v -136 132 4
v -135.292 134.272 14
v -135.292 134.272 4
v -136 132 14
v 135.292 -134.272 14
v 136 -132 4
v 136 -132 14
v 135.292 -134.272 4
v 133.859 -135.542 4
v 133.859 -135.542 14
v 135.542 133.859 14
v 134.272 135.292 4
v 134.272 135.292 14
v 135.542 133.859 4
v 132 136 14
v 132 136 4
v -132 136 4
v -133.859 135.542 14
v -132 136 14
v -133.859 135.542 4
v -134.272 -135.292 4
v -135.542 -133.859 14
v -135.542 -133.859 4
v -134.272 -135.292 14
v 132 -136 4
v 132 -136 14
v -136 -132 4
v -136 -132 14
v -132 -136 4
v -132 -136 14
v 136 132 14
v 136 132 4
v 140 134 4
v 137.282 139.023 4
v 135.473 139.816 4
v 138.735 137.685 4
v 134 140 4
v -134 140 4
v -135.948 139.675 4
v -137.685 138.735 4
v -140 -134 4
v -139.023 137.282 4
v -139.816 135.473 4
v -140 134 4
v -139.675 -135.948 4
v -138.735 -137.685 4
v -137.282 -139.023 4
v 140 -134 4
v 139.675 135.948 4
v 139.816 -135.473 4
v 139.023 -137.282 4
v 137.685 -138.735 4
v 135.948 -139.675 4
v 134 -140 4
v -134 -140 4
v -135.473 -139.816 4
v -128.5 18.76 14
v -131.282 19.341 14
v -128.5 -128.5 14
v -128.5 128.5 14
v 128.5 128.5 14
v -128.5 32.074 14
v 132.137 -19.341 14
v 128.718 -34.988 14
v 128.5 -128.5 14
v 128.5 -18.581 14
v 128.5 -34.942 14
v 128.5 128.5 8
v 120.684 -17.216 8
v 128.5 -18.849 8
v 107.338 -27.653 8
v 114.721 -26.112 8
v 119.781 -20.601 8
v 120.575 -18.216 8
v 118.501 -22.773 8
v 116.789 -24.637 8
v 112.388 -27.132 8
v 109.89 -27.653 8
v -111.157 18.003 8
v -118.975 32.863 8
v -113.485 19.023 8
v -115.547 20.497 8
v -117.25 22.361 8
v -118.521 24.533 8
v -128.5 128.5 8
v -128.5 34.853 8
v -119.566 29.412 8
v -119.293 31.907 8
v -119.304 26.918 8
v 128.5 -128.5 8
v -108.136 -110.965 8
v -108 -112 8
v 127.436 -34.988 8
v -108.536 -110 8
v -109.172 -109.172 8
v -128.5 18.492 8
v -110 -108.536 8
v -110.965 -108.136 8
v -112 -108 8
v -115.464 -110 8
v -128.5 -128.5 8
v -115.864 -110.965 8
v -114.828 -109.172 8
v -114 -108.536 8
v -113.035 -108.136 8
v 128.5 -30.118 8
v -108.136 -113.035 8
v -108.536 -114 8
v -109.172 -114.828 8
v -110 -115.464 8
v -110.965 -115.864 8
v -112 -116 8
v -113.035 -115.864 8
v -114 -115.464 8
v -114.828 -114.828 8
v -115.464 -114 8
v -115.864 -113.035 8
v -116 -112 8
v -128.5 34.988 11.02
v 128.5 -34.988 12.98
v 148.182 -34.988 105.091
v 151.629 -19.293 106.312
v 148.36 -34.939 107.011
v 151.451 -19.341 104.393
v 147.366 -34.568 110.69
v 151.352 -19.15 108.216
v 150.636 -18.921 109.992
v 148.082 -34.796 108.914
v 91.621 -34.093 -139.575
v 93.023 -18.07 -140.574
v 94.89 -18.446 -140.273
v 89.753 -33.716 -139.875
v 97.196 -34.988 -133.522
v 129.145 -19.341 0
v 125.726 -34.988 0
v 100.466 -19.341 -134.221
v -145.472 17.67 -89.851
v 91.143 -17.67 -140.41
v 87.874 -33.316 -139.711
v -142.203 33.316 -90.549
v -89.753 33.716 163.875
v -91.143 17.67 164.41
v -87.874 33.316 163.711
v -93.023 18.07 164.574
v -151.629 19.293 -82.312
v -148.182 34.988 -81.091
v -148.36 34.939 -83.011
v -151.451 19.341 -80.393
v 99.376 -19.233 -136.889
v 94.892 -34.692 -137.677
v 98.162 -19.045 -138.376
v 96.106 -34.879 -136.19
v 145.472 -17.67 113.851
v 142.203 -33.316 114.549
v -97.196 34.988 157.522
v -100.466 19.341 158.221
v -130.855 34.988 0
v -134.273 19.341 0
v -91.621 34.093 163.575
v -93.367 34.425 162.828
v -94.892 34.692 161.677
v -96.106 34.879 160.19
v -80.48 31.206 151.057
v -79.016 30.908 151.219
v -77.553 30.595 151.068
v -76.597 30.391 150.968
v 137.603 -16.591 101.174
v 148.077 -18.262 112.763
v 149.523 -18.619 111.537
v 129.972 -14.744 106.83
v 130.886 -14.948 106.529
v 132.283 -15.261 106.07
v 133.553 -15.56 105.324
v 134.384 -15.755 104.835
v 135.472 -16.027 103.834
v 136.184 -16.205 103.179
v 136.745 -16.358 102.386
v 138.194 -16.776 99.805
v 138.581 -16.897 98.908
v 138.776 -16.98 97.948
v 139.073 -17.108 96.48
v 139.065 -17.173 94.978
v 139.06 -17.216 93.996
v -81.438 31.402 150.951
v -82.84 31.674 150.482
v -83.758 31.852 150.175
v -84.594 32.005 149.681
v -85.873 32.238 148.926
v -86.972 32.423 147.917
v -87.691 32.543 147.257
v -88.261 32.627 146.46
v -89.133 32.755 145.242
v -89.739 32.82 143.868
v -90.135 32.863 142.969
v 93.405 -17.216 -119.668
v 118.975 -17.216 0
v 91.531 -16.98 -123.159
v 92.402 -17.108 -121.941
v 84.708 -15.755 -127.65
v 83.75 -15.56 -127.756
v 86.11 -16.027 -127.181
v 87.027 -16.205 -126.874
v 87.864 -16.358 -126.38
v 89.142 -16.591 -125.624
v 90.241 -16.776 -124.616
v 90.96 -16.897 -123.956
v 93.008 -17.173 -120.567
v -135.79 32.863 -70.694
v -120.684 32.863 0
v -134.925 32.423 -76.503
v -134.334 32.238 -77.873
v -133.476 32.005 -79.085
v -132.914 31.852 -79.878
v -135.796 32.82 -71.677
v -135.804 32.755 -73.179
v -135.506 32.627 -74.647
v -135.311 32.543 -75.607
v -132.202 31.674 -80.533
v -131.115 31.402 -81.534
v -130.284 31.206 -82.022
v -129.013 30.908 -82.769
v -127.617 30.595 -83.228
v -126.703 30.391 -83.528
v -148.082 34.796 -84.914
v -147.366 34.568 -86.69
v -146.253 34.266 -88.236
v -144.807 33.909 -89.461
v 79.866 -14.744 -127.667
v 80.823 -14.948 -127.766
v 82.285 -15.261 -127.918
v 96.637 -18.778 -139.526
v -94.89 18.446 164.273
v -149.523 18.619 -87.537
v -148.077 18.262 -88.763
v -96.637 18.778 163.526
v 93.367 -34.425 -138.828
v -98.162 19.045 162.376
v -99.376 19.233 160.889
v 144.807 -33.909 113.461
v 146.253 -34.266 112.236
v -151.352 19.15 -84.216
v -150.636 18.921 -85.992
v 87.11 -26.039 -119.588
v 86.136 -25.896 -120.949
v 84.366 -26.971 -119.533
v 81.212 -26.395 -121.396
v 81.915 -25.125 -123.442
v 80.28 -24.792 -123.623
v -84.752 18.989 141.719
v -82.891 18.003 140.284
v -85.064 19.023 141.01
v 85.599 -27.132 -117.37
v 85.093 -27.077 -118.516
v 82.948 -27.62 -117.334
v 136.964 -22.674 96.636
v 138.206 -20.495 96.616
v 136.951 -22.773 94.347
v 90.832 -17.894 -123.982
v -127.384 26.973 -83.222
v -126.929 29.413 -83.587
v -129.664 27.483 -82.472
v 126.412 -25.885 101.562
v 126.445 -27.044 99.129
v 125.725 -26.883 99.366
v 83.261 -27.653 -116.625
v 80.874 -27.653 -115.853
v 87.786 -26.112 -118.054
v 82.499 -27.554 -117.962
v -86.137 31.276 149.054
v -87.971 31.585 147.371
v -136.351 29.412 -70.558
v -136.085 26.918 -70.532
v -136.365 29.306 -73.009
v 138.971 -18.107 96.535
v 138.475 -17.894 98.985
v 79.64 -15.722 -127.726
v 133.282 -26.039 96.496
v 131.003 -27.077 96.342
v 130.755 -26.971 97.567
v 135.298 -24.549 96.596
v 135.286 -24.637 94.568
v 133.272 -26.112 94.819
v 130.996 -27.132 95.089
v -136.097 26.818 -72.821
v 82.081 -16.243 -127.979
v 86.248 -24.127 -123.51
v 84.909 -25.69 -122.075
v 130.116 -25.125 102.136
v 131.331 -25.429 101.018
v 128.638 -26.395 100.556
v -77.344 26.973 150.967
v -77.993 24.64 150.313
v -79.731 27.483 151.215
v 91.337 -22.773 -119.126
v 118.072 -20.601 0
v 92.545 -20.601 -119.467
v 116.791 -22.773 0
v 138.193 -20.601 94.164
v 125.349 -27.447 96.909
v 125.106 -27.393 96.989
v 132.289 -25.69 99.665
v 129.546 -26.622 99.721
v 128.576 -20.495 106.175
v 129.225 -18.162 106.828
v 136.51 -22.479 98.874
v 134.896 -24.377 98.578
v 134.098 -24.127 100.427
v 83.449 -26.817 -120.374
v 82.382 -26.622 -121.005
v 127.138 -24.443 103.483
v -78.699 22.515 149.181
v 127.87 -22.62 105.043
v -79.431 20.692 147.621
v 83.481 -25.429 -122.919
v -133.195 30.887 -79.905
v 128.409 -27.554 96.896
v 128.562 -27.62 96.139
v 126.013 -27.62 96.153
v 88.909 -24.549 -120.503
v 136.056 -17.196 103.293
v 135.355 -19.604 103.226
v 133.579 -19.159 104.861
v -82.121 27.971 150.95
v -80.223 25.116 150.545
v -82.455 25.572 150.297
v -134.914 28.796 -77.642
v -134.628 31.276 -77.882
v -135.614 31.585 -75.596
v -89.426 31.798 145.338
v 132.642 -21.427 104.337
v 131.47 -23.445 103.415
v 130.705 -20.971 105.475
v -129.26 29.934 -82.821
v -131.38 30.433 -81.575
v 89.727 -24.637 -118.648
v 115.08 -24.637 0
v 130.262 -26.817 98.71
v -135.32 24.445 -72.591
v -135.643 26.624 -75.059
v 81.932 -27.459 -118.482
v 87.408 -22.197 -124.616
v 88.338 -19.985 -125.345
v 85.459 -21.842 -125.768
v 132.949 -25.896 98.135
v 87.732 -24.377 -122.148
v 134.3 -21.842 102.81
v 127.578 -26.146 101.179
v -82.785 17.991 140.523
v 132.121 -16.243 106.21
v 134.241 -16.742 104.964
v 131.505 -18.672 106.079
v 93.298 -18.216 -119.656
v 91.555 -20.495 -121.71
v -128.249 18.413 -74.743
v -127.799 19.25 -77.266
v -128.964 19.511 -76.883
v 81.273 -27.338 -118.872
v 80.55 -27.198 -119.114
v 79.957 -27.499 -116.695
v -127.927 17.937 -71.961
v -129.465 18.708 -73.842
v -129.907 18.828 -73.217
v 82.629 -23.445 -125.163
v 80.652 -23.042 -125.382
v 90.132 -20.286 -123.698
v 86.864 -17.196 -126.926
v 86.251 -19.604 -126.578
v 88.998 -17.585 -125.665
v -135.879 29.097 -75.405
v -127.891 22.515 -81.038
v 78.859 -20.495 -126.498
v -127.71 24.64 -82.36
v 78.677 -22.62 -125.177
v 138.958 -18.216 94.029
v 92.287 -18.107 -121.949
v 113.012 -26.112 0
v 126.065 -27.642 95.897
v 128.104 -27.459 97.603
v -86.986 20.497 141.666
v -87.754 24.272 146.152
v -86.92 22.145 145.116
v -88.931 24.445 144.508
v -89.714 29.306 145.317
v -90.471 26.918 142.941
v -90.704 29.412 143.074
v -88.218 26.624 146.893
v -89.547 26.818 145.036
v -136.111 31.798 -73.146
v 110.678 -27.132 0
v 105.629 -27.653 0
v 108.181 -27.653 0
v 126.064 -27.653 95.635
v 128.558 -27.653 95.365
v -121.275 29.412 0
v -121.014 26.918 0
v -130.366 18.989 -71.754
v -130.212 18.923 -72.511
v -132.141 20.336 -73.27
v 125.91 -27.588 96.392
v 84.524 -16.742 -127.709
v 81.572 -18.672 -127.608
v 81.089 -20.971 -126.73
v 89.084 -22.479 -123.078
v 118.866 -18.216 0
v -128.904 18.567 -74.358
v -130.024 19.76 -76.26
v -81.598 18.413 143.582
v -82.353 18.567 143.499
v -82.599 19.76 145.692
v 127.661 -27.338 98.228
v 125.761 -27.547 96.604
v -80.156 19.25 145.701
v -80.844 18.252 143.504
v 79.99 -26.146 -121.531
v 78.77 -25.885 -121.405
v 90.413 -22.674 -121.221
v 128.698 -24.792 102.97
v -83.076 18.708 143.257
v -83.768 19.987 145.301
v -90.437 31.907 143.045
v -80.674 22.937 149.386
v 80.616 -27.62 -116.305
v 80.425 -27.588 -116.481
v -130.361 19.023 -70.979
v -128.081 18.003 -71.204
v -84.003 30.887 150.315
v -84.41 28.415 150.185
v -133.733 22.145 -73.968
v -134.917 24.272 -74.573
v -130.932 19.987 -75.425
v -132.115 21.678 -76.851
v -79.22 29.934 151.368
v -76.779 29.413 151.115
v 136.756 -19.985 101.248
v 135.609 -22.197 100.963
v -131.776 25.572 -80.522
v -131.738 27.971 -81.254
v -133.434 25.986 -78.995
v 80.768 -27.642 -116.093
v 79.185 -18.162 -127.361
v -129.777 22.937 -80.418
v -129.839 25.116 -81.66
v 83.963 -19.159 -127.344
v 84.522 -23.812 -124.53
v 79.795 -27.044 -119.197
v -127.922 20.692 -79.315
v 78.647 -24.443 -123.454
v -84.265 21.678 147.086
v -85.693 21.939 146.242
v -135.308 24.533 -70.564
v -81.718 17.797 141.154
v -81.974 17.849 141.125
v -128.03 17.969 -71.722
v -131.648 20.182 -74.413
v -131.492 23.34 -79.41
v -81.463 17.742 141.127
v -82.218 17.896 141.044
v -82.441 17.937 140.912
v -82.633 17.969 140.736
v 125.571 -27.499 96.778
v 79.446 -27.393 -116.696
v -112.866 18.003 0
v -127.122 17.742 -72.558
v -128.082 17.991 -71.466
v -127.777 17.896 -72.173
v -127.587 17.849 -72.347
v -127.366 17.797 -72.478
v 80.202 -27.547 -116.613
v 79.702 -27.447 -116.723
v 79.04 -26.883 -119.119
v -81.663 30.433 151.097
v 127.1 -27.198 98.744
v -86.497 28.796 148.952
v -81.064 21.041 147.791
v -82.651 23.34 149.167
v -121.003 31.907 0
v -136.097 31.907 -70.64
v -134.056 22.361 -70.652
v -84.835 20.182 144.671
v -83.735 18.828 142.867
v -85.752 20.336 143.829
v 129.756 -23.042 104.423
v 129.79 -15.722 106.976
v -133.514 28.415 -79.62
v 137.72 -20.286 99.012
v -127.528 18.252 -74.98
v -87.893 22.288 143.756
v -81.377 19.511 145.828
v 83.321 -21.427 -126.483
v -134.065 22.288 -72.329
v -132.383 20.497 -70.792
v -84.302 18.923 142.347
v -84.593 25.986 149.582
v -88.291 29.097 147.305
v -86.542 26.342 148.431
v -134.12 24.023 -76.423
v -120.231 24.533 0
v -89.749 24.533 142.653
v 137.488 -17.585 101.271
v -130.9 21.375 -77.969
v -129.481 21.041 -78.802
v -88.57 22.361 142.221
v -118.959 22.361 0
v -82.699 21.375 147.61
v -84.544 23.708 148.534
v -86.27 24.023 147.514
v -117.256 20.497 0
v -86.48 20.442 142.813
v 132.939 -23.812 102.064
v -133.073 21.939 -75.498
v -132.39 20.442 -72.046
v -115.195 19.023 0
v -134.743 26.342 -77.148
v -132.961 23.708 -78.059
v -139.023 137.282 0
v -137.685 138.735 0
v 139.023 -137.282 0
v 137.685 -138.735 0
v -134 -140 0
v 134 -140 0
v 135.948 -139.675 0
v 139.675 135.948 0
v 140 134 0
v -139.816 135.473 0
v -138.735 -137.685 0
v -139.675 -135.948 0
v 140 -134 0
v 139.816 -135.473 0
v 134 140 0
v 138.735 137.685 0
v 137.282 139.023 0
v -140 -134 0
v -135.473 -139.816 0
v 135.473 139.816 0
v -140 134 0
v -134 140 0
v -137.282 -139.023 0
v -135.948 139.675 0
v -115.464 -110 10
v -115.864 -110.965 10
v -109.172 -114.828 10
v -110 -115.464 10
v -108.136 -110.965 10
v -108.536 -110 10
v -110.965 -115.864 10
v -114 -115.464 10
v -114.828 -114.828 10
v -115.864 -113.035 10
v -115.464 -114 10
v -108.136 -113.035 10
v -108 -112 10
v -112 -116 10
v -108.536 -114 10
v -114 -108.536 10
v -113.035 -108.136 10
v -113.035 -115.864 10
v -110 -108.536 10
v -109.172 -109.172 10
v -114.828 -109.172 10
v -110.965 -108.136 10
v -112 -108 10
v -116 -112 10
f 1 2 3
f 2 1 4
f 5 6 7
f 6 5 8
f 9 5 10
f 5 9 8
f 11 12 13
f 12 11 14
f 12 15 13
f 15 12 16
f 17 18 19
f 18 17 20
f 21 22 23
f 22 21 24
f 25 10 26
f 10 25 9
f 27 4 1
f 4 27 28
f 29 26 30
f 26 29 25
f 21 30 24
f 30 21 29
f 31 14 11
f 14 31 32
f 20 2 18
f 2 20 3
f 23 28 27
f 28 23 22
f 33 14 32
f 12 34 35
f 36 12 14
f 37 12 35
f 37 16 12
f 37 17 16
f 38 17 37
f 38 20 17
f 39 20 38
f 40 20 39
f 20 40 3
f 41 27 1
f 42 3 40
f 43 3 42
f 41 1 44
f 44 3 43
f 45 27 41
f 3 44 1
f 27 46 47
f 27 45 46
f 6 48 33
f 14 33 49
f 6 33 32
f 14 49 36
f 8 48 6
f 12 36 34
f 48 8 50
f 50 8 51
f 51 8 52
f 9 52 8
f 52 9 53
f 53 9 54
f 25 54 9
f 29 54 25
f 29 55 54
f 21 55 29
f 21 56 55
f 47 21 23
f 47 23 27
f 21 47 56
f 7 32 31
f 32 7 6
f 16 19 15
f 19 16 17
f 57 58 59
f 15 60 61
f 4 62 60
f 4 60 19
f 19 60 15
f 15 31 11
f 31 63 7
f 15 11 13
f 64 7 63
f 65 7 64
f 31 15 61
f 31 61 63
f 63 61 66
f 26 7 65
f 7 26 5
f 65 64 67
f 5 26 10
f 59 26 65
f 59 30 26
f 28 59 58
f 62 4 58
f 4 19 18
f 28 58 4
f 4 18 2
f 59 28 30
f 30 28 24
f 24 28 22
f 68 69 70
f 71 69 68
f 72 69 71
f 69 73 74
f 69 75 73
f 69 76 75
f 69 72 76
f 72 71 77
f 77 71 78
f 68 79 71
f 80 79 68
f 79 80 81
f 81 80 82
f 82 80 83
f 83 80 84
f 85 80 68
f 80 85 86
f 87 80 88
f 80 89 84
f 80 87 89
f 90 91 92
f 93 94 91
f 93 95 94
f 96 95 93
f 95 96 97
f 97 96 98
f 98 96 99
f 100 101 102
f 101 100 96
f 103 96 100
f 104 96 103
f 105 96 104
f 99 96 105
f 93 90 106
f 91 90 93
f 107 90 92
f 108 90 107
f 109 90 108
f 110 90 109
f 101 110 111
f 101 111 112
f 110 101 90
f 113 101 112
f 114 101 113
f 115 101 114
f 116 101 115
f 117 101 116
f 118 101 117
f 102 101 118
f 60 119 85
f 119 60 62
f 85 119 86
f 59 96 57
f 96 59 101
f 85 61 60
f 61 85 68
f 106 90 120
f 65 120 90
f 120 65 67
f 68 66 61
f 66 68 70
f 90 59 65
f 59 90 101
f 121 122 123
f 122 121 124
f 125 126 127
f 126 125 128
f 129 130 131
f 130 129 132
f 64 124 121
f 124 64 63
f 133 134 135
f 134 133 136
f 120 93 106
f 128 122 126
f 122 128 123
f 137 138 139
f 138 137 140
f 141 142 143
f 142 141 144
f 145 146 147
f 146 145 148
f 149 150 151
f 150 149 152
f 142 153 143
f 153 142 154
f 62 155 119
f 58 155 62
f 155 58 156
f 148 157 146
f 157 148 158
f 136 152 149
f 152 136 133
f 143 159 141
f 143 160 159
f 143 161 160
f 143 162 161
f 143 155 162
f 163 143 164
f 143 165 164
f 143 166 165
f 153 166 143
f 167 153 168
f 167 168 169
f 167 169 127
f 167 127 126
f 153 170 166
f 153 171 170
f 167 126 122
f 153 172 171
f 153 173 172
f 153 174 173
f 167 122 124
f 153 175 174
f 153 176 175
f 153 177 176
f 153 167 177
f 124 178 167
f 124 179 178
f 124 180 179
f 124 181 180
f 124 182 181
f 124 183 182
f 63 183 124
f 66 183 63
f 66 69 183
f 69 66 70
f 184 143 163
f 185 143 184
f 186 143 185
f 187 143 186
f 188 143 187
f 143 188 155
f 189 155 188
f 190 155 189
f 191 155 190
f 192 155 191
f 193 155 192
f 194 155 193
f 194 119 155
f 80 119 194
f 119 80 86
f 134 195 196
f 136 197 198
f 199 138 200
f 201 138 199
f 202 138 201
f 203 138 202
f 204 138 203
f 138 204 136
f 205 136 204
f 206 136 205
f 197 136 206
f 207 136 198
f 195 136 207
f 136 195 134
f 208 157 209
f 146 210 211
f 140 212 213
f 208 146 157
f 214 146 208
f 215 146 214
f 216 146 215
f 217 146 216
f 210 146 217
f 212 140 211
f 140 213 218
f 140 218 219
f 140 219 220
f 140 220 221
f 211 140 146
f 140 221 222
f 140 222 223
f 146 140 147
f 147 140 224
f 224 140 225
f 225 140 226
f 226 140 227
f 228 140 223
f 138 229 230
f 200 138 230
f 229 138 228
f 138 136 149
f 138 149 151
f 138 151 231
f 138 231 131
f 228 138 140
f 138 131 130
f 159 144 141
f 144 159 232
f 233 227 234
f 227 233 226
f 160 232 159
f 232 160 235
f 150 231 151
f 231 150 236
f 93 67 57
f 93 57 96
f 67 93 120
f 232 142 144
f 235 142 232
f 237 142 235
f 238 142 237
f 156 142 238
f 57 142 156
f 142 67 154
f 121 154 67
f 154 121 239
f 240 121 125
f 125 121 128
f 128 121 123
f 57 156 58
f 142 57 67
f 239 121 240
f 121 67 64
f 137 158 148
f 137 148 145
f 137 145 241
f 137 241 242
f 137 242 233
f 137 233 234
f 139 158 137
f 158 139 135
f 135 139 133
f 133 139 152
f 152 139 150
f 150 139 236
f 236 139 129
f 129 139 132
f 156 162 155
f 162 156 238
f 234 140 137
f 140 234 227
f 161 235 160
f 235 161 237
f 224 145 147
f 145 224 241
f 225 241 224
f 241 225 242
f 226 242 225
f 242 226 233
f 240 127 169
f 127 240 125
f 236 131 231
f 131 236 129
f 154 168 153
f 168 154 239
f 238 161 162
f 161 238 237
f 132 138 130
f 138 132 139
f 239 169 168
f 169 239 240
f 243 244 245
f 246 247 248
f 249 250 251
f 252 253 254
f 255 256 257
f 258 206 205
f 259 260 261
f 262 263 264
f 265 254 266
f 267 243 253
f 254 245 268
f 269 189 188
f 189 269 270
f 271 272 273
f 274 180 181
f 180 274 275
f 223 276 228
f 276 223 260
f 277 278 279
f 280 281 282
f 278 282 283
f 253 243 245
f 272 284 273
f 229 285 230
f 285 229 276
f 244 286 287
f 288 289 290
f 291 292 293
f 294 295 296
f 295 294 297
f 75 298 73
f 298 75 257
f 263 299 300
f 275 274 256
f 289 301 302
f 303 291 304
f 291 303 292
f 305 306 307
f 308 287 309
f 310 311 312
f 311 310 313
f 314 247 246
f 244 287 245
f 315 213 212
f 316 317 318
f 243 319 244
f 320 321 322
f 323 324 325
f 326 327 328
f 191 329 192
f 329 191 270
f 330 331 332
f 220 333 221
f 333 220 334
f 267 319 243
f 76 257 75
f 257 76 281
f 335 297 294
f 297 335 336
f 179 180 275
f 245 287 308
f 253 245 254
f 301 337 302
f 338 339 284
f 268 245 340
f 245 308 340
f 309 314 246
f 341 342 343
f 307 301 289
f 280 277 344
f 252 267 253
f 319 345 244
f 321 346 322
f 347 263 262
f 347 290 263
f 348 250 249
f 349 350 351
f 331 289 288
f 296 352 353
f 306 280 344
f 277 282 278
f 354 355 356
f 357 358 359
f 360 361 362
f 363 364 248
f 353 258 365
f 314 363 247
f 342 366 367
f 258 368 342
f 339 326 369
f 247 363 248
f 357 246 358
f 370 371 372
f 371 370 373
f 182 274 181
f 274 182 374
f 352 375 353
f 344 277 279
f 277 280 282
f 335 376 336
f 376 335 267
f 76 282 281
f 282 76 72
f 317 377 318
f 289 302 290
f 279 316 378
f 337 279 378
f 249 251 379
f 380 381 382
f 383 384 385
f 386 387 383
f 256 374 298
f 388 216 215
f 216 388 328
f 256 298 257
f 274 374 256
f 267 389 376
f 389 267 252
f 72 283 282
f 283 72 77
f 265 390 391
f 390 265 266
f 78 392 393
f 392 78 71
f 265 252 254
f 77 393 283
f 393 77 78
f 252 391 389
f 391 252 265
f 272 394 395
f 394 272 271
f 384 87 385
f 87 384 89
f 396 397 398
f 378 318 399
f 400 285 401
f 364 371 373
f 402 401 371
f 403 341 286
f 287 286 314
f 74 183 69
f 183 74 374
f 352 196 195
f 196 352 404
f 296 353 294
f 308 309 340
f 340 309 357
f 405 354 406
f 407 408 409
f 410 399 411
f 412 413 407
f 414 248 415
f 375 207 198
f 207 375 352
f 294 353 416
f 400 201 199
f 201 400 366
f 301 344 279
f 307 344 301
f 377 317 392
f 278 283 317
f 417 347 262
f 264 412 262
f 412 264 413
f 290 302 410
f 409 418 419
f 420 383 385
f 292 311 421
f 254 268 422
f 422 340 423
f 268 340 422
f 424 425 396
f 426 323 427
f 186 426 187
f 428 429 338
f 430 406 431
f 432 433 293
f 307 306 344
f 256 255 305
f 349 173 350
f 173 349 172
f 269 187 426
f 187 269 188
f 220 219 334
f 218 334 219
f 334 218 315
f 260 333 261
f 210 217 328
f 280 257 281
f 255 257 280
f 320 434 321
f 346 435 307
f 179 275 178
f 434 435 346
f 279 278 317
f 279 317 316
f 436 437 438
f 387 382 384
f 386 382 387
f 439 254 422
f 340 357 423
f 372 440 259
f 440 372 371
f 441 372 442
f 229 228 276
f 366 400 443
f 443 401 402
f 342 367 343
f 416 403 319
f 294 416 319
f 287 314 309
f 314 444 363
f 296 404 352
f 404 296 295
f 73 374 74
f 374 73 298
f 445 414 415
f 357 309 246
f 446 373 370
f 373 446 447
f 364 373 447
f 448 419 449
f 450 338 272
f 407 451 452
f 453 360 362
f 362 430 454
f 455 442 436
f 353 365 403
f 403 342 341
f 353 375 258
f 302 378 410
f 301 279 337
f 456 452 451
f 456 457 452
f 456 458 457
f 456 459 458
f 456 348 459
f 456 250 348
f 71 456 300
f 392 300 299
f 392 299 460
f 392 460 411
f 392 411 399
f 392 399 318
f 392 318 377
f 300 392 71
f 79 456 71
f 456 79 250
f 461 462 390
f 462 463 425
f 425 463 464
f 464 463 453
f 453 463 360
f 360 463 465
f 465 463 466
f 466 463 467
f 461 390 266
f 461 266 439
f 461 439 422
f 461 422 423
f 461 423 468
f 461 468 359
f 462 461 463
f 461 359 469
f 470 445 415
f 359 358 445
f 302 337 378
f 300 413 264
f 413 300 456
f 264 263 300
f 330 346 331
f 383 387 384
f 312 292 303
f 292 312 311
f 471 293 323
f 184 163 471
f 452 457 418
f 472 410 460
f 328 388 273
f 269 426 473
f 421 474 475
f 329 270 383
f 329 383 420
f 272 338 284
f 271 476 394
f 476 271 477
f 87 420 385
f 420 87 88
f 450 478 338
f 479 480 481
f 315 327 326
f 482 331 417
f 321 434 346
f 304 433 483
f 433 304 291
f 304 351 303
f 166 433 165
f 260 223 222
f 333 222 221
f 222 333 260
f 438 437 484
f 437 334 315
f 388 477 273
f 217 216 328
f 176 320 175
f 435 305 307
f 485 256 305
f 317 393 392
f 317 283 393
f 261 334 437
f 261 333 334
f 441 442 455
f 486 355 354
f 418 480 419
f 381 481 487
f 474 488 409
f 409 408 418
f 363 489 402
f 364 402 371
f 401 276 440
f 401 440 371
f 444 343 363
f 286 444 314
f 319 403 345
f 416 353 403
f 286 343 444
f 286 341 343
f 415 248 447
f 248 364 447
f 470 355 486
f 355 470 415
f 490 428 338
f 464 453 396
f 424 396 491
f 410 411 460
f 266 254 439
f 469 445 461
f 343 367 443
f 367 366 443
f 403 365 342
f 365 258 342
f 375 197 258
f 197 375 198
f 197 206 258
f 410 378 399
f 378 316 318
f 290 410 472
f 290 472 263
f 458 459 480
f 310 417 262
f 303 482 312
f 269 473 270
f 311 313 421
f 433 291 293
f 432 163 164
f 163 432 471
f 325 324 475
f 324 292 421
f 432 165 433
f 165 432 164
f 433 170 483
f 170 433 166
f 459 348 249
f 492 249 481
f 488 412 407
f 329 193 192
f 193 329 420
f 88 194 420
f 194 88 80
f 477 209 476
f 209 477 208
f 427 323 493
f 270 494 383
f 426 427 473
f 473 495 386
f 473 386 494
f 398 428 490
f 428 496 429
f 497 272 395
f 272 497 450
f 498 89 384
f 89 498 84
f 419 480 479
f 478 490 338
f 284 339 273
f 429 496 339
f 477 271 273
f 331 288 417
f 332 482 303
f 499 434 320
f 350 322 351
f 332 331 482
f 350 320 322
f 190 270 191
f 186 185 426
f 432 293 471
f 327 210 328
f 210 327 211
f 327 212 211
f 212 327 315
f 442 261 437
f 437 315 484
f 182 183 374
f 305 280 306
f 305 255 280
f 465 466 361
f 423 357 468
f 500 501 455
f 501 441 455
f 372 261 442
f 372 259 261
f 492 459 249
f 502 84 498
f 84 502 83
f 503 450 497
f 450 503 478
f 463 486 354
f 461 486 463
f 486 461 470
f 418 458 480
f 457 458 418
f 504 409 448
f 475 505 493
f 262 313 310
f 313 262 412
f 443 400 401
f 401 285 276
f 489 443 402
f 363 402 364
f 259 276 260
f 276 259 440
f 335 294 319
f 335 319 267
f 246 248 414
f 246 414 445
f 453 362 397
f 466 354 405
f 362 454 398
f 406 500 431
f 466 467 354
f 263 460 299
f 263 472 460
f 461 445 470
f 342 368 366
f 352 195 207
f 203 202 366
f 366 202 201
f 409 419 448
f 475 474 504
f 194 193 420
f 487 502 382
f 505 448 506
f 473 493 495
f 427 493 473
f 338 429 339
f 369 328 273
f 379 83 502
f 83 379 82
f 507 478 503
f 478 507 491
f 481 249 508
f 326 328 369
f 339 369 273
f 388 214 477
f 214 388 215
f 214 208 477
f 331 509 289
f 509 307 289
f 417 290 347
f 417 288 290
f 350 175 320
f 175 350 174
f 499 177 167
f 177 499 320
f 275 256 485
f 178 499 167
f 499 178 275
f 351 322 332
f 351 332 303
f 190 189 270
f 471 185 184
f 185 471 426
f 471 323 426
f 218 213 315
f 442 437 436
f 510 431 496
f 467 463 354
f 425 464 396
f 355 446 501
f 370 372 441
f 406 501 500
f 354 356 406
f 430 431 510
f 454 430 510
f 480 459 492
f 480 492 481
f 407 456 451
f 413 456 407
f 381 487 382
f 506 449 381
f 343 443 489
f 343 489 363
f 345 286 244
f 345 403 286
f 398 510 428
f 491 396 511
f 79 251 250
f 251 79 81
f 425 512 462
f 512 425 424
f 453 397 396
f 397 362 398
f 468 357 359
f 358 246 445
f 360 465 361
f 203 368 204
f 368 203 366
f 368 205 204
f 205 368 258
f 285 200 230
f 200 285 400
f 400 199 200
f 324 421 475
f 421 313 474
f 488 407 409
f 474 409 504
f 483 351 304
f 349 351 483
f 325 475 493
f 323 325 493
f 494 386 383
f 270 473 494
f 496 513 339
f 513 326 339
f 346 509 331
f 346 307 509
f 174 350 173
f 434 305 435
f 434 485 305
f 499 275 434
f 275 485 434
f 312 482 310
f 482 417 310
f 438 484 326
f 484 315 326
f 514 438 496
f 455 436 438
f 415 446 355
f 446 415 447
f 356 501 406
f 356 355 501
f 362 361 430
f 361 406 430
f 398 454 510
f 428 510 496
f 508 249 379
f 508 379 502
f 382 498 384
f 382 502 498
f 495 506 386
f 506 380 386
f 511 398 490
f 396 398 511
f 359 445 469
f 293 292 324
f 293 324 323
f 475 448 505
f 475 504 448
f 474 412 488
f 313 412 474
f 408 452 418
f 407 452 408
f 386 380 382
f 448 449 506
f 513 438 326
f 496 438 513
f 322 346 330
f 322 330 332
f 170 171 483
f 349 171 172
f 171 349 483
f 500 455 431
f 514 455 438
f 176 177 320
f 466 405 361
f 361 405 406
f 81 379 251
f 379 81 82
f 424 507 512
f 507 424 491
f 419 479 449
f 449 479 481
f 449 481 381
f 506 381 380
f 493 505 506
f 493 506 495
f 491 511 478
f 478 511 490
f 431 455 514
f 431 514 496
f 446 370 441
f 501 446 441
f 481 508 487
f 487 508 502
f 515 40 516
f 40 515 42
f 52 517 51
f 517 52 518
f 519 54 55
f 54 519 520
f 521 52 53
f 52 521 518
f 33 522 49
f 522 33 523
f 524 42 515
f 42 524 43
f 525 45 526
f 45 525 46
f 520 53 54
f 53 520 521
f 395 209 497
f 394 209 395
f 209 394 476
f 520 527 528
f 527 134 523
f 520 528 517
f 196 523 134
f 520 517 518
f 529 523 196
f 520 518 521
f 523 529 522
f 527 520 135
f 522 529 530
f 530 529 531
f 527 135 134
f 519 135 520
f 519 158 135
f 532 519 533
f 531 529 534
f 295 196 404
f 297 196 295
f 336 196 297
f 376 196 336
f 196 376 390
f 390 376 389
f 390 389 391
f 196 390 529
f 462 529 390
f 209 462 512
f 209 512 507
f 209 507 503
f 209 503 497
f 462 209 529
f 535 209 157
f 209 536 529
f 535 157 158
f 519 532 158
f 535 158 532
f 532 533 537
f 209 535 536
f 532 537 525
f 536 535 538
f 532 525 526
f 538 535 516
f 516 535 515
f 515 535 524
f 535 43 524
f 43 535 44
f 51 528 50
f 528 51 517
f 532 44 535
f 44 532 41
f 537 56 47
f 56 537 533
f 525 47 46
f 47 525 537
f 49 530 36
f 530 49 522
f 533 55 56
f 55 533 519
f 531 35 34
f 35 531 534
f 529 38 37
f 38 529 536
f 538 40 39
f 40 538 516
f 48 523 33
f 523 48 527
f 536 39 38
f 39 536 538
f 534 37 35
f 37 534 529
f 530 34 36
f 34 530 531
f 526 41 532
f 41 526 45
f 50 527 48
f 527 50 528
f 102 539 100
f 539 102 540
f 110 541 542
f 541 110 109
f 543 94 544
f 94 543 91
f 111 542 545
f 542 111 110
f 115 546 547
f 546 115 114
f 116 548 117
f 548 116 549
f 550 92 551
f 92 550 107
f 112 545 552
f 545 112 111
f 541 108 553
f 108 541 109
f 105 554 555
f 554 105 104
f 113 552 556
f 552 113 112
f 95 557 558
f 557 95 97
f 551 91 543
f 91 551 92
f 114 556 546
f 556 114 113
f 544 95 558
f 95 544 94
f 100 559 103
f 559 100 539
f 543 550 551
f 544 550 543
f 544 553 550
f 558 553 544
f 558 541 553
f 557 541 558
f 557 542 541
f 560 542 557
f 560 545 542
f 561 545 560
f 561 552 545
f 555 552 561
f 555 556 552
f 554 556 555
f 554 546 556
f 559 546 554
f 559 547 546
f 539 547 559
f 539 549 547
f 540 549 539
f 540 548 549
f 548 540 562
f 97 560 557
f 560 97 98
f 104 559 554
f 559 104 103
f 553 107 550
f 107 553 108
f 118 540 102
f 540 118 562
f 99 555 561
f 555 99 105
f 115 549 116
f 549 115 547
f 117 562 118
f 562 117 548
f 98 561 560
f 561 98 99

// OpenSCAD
// file: service_tray.scad
// SmartAI service tray — removable drink/food carrier
// Units: mm. Mounts on zen slab oak top plate (Variant A default).
// Design goals: easy to clean (smooth bowl, drain slope), easy to integrate (bolt flange).

// --- Defaults (Customizer when included from service-tray-standalone.scad) ---
TRAY_W = 260;
TRAY_L = 260;
BOWL_DEPTH = 16;
LIP_H = 10;
FLANGE_T = 4;
DRAIN_SLOPE = 0.018;  // ~1° toward rear-left for spill runoff
LIP_THICK = 3;
BOWL_FILLET = 12;

// Mount: 4× M3 clearance on square pattern
MOUNT_HOLE_D = 3.4;
MOUNT_SPREAD_W = 220;
MOUNT_SPREAD_L = 220;

module tray_bowl_interior(w, l, depth, fillet) {
  // Smooth rounded cavity — no sharp corners (easy to wipe)
  translate([0, 0, -depth / 2])
    hull() {
      for (sx = [-1, 1], sy = [-1, 1])
        translate([sx * (w / 2 - fillet), sy * (l / 2 - fillet), 0])
          sphere(r = fillet);
      translate([0, 0, -depth + fillet])
        scale([1, 1, 0.35])
          sphere(r = fillet);
    }
}

module service_tray(
  w = TRAY_W,
  l = TRAY_L,
  bowl_depth = BOWL_DEPTH,
  lip_h = LIP_H,
  flange_t = FLANGE_T,
  drain_slope = DRAIN_SLOPE
) {
  color([0.92, 0.90, 0.86, 1])  // warm off-white — food-safe print material hint
    union() {
      // Mounting flange (sits on oak top plate)
      translate([0, 0, flange_t / 2])
        linear_extrude(height = flange_t, center = true)
          offset(r = 6)
            square([w + 8, l + 8], center = true);

      // Lip ring
      translate([0, 0, flange_t + lip_h / 2])
        difference() {
          linear_extrude(height = lip_h, center = true)
            offset(r = 4)
              square([w + 4, l + 4], center = true);
          translate([0, 0, -1])
            linear_extrude(height = lip_h + 2)
              square([w - LIP_THICK, l - LIP_THICK], center = true);
        }

      // Bowl (sloped floor: rear-left lowest)
      translate([0, 0, flange_t + bowl_depth / 2])
        rotate([atan(drain_slope * l), -atan(drain_slope * w), 0])
          difference() {
            linear_extrude(height = bowl_depth, center = true, convexity = 8)
              offset(r = 8)
                square([w - 16, l - 16], center = true);
            tray_bowl_interior(w - 20, l - 20, bowl_depth - 2, BOWL_FILLET);
          }
    }

  // Drain well at lowest corner (rear-left, -X -Y)
  color([0.75, 0.75, 0.78, 1])
    translate([-w / 2 + 18, -l / 2 + 18, flange_t + 2])
      cylinder(h = 4, d = 8, $fn = 24);
}

module service_tray_mount_holes(
  spread_w = MOUNT_SPREAD_W,
  spread_l = MOUNT_SPREAD_L,
  hole_d = MOUNT_HOLE_D,
  z = 0
) {
  for (sx = [-1, 1], sy = [-1, 1])
    translate([sx * spread_w / 2, sy * spread_l / 2, z])
      cylinder(h = 20, d = hole_d, center = true, $fn = 20);
}

// Integrate on robot: flange bottom flush with oak top
module service_tray_on_robot(z_top, w = TRAY_W, l = TRAY_L) {
  translate([0, 0, z_top + FLANGE_T / 2])
    service_tray(w, l);
}

// Cut bolt holes through oak top + slab (call from variant difference())
module service_tray_mount_cuts(z_top, spread_w = MOUNT_SPREAD_W, spread_l = MOUNT_SPREAD_L) {
  service_tray_mount_holes(spread_w, spread_l, MOUNT_HOLE_D, z_top);
}
// main file
// Standalone export: service tray only (print separately, bolt to robot top)
// Export: openscad -o service-tray.stl service-tray-standalone.scad

include <service_tray.scad>

/* [Tray] */
tray_w = 260;
tray_l = 260;
bowl_depth = 16;
lip_h = 10;

service_tray(tray_w, tray_l, bowl_depth, lip_h);
